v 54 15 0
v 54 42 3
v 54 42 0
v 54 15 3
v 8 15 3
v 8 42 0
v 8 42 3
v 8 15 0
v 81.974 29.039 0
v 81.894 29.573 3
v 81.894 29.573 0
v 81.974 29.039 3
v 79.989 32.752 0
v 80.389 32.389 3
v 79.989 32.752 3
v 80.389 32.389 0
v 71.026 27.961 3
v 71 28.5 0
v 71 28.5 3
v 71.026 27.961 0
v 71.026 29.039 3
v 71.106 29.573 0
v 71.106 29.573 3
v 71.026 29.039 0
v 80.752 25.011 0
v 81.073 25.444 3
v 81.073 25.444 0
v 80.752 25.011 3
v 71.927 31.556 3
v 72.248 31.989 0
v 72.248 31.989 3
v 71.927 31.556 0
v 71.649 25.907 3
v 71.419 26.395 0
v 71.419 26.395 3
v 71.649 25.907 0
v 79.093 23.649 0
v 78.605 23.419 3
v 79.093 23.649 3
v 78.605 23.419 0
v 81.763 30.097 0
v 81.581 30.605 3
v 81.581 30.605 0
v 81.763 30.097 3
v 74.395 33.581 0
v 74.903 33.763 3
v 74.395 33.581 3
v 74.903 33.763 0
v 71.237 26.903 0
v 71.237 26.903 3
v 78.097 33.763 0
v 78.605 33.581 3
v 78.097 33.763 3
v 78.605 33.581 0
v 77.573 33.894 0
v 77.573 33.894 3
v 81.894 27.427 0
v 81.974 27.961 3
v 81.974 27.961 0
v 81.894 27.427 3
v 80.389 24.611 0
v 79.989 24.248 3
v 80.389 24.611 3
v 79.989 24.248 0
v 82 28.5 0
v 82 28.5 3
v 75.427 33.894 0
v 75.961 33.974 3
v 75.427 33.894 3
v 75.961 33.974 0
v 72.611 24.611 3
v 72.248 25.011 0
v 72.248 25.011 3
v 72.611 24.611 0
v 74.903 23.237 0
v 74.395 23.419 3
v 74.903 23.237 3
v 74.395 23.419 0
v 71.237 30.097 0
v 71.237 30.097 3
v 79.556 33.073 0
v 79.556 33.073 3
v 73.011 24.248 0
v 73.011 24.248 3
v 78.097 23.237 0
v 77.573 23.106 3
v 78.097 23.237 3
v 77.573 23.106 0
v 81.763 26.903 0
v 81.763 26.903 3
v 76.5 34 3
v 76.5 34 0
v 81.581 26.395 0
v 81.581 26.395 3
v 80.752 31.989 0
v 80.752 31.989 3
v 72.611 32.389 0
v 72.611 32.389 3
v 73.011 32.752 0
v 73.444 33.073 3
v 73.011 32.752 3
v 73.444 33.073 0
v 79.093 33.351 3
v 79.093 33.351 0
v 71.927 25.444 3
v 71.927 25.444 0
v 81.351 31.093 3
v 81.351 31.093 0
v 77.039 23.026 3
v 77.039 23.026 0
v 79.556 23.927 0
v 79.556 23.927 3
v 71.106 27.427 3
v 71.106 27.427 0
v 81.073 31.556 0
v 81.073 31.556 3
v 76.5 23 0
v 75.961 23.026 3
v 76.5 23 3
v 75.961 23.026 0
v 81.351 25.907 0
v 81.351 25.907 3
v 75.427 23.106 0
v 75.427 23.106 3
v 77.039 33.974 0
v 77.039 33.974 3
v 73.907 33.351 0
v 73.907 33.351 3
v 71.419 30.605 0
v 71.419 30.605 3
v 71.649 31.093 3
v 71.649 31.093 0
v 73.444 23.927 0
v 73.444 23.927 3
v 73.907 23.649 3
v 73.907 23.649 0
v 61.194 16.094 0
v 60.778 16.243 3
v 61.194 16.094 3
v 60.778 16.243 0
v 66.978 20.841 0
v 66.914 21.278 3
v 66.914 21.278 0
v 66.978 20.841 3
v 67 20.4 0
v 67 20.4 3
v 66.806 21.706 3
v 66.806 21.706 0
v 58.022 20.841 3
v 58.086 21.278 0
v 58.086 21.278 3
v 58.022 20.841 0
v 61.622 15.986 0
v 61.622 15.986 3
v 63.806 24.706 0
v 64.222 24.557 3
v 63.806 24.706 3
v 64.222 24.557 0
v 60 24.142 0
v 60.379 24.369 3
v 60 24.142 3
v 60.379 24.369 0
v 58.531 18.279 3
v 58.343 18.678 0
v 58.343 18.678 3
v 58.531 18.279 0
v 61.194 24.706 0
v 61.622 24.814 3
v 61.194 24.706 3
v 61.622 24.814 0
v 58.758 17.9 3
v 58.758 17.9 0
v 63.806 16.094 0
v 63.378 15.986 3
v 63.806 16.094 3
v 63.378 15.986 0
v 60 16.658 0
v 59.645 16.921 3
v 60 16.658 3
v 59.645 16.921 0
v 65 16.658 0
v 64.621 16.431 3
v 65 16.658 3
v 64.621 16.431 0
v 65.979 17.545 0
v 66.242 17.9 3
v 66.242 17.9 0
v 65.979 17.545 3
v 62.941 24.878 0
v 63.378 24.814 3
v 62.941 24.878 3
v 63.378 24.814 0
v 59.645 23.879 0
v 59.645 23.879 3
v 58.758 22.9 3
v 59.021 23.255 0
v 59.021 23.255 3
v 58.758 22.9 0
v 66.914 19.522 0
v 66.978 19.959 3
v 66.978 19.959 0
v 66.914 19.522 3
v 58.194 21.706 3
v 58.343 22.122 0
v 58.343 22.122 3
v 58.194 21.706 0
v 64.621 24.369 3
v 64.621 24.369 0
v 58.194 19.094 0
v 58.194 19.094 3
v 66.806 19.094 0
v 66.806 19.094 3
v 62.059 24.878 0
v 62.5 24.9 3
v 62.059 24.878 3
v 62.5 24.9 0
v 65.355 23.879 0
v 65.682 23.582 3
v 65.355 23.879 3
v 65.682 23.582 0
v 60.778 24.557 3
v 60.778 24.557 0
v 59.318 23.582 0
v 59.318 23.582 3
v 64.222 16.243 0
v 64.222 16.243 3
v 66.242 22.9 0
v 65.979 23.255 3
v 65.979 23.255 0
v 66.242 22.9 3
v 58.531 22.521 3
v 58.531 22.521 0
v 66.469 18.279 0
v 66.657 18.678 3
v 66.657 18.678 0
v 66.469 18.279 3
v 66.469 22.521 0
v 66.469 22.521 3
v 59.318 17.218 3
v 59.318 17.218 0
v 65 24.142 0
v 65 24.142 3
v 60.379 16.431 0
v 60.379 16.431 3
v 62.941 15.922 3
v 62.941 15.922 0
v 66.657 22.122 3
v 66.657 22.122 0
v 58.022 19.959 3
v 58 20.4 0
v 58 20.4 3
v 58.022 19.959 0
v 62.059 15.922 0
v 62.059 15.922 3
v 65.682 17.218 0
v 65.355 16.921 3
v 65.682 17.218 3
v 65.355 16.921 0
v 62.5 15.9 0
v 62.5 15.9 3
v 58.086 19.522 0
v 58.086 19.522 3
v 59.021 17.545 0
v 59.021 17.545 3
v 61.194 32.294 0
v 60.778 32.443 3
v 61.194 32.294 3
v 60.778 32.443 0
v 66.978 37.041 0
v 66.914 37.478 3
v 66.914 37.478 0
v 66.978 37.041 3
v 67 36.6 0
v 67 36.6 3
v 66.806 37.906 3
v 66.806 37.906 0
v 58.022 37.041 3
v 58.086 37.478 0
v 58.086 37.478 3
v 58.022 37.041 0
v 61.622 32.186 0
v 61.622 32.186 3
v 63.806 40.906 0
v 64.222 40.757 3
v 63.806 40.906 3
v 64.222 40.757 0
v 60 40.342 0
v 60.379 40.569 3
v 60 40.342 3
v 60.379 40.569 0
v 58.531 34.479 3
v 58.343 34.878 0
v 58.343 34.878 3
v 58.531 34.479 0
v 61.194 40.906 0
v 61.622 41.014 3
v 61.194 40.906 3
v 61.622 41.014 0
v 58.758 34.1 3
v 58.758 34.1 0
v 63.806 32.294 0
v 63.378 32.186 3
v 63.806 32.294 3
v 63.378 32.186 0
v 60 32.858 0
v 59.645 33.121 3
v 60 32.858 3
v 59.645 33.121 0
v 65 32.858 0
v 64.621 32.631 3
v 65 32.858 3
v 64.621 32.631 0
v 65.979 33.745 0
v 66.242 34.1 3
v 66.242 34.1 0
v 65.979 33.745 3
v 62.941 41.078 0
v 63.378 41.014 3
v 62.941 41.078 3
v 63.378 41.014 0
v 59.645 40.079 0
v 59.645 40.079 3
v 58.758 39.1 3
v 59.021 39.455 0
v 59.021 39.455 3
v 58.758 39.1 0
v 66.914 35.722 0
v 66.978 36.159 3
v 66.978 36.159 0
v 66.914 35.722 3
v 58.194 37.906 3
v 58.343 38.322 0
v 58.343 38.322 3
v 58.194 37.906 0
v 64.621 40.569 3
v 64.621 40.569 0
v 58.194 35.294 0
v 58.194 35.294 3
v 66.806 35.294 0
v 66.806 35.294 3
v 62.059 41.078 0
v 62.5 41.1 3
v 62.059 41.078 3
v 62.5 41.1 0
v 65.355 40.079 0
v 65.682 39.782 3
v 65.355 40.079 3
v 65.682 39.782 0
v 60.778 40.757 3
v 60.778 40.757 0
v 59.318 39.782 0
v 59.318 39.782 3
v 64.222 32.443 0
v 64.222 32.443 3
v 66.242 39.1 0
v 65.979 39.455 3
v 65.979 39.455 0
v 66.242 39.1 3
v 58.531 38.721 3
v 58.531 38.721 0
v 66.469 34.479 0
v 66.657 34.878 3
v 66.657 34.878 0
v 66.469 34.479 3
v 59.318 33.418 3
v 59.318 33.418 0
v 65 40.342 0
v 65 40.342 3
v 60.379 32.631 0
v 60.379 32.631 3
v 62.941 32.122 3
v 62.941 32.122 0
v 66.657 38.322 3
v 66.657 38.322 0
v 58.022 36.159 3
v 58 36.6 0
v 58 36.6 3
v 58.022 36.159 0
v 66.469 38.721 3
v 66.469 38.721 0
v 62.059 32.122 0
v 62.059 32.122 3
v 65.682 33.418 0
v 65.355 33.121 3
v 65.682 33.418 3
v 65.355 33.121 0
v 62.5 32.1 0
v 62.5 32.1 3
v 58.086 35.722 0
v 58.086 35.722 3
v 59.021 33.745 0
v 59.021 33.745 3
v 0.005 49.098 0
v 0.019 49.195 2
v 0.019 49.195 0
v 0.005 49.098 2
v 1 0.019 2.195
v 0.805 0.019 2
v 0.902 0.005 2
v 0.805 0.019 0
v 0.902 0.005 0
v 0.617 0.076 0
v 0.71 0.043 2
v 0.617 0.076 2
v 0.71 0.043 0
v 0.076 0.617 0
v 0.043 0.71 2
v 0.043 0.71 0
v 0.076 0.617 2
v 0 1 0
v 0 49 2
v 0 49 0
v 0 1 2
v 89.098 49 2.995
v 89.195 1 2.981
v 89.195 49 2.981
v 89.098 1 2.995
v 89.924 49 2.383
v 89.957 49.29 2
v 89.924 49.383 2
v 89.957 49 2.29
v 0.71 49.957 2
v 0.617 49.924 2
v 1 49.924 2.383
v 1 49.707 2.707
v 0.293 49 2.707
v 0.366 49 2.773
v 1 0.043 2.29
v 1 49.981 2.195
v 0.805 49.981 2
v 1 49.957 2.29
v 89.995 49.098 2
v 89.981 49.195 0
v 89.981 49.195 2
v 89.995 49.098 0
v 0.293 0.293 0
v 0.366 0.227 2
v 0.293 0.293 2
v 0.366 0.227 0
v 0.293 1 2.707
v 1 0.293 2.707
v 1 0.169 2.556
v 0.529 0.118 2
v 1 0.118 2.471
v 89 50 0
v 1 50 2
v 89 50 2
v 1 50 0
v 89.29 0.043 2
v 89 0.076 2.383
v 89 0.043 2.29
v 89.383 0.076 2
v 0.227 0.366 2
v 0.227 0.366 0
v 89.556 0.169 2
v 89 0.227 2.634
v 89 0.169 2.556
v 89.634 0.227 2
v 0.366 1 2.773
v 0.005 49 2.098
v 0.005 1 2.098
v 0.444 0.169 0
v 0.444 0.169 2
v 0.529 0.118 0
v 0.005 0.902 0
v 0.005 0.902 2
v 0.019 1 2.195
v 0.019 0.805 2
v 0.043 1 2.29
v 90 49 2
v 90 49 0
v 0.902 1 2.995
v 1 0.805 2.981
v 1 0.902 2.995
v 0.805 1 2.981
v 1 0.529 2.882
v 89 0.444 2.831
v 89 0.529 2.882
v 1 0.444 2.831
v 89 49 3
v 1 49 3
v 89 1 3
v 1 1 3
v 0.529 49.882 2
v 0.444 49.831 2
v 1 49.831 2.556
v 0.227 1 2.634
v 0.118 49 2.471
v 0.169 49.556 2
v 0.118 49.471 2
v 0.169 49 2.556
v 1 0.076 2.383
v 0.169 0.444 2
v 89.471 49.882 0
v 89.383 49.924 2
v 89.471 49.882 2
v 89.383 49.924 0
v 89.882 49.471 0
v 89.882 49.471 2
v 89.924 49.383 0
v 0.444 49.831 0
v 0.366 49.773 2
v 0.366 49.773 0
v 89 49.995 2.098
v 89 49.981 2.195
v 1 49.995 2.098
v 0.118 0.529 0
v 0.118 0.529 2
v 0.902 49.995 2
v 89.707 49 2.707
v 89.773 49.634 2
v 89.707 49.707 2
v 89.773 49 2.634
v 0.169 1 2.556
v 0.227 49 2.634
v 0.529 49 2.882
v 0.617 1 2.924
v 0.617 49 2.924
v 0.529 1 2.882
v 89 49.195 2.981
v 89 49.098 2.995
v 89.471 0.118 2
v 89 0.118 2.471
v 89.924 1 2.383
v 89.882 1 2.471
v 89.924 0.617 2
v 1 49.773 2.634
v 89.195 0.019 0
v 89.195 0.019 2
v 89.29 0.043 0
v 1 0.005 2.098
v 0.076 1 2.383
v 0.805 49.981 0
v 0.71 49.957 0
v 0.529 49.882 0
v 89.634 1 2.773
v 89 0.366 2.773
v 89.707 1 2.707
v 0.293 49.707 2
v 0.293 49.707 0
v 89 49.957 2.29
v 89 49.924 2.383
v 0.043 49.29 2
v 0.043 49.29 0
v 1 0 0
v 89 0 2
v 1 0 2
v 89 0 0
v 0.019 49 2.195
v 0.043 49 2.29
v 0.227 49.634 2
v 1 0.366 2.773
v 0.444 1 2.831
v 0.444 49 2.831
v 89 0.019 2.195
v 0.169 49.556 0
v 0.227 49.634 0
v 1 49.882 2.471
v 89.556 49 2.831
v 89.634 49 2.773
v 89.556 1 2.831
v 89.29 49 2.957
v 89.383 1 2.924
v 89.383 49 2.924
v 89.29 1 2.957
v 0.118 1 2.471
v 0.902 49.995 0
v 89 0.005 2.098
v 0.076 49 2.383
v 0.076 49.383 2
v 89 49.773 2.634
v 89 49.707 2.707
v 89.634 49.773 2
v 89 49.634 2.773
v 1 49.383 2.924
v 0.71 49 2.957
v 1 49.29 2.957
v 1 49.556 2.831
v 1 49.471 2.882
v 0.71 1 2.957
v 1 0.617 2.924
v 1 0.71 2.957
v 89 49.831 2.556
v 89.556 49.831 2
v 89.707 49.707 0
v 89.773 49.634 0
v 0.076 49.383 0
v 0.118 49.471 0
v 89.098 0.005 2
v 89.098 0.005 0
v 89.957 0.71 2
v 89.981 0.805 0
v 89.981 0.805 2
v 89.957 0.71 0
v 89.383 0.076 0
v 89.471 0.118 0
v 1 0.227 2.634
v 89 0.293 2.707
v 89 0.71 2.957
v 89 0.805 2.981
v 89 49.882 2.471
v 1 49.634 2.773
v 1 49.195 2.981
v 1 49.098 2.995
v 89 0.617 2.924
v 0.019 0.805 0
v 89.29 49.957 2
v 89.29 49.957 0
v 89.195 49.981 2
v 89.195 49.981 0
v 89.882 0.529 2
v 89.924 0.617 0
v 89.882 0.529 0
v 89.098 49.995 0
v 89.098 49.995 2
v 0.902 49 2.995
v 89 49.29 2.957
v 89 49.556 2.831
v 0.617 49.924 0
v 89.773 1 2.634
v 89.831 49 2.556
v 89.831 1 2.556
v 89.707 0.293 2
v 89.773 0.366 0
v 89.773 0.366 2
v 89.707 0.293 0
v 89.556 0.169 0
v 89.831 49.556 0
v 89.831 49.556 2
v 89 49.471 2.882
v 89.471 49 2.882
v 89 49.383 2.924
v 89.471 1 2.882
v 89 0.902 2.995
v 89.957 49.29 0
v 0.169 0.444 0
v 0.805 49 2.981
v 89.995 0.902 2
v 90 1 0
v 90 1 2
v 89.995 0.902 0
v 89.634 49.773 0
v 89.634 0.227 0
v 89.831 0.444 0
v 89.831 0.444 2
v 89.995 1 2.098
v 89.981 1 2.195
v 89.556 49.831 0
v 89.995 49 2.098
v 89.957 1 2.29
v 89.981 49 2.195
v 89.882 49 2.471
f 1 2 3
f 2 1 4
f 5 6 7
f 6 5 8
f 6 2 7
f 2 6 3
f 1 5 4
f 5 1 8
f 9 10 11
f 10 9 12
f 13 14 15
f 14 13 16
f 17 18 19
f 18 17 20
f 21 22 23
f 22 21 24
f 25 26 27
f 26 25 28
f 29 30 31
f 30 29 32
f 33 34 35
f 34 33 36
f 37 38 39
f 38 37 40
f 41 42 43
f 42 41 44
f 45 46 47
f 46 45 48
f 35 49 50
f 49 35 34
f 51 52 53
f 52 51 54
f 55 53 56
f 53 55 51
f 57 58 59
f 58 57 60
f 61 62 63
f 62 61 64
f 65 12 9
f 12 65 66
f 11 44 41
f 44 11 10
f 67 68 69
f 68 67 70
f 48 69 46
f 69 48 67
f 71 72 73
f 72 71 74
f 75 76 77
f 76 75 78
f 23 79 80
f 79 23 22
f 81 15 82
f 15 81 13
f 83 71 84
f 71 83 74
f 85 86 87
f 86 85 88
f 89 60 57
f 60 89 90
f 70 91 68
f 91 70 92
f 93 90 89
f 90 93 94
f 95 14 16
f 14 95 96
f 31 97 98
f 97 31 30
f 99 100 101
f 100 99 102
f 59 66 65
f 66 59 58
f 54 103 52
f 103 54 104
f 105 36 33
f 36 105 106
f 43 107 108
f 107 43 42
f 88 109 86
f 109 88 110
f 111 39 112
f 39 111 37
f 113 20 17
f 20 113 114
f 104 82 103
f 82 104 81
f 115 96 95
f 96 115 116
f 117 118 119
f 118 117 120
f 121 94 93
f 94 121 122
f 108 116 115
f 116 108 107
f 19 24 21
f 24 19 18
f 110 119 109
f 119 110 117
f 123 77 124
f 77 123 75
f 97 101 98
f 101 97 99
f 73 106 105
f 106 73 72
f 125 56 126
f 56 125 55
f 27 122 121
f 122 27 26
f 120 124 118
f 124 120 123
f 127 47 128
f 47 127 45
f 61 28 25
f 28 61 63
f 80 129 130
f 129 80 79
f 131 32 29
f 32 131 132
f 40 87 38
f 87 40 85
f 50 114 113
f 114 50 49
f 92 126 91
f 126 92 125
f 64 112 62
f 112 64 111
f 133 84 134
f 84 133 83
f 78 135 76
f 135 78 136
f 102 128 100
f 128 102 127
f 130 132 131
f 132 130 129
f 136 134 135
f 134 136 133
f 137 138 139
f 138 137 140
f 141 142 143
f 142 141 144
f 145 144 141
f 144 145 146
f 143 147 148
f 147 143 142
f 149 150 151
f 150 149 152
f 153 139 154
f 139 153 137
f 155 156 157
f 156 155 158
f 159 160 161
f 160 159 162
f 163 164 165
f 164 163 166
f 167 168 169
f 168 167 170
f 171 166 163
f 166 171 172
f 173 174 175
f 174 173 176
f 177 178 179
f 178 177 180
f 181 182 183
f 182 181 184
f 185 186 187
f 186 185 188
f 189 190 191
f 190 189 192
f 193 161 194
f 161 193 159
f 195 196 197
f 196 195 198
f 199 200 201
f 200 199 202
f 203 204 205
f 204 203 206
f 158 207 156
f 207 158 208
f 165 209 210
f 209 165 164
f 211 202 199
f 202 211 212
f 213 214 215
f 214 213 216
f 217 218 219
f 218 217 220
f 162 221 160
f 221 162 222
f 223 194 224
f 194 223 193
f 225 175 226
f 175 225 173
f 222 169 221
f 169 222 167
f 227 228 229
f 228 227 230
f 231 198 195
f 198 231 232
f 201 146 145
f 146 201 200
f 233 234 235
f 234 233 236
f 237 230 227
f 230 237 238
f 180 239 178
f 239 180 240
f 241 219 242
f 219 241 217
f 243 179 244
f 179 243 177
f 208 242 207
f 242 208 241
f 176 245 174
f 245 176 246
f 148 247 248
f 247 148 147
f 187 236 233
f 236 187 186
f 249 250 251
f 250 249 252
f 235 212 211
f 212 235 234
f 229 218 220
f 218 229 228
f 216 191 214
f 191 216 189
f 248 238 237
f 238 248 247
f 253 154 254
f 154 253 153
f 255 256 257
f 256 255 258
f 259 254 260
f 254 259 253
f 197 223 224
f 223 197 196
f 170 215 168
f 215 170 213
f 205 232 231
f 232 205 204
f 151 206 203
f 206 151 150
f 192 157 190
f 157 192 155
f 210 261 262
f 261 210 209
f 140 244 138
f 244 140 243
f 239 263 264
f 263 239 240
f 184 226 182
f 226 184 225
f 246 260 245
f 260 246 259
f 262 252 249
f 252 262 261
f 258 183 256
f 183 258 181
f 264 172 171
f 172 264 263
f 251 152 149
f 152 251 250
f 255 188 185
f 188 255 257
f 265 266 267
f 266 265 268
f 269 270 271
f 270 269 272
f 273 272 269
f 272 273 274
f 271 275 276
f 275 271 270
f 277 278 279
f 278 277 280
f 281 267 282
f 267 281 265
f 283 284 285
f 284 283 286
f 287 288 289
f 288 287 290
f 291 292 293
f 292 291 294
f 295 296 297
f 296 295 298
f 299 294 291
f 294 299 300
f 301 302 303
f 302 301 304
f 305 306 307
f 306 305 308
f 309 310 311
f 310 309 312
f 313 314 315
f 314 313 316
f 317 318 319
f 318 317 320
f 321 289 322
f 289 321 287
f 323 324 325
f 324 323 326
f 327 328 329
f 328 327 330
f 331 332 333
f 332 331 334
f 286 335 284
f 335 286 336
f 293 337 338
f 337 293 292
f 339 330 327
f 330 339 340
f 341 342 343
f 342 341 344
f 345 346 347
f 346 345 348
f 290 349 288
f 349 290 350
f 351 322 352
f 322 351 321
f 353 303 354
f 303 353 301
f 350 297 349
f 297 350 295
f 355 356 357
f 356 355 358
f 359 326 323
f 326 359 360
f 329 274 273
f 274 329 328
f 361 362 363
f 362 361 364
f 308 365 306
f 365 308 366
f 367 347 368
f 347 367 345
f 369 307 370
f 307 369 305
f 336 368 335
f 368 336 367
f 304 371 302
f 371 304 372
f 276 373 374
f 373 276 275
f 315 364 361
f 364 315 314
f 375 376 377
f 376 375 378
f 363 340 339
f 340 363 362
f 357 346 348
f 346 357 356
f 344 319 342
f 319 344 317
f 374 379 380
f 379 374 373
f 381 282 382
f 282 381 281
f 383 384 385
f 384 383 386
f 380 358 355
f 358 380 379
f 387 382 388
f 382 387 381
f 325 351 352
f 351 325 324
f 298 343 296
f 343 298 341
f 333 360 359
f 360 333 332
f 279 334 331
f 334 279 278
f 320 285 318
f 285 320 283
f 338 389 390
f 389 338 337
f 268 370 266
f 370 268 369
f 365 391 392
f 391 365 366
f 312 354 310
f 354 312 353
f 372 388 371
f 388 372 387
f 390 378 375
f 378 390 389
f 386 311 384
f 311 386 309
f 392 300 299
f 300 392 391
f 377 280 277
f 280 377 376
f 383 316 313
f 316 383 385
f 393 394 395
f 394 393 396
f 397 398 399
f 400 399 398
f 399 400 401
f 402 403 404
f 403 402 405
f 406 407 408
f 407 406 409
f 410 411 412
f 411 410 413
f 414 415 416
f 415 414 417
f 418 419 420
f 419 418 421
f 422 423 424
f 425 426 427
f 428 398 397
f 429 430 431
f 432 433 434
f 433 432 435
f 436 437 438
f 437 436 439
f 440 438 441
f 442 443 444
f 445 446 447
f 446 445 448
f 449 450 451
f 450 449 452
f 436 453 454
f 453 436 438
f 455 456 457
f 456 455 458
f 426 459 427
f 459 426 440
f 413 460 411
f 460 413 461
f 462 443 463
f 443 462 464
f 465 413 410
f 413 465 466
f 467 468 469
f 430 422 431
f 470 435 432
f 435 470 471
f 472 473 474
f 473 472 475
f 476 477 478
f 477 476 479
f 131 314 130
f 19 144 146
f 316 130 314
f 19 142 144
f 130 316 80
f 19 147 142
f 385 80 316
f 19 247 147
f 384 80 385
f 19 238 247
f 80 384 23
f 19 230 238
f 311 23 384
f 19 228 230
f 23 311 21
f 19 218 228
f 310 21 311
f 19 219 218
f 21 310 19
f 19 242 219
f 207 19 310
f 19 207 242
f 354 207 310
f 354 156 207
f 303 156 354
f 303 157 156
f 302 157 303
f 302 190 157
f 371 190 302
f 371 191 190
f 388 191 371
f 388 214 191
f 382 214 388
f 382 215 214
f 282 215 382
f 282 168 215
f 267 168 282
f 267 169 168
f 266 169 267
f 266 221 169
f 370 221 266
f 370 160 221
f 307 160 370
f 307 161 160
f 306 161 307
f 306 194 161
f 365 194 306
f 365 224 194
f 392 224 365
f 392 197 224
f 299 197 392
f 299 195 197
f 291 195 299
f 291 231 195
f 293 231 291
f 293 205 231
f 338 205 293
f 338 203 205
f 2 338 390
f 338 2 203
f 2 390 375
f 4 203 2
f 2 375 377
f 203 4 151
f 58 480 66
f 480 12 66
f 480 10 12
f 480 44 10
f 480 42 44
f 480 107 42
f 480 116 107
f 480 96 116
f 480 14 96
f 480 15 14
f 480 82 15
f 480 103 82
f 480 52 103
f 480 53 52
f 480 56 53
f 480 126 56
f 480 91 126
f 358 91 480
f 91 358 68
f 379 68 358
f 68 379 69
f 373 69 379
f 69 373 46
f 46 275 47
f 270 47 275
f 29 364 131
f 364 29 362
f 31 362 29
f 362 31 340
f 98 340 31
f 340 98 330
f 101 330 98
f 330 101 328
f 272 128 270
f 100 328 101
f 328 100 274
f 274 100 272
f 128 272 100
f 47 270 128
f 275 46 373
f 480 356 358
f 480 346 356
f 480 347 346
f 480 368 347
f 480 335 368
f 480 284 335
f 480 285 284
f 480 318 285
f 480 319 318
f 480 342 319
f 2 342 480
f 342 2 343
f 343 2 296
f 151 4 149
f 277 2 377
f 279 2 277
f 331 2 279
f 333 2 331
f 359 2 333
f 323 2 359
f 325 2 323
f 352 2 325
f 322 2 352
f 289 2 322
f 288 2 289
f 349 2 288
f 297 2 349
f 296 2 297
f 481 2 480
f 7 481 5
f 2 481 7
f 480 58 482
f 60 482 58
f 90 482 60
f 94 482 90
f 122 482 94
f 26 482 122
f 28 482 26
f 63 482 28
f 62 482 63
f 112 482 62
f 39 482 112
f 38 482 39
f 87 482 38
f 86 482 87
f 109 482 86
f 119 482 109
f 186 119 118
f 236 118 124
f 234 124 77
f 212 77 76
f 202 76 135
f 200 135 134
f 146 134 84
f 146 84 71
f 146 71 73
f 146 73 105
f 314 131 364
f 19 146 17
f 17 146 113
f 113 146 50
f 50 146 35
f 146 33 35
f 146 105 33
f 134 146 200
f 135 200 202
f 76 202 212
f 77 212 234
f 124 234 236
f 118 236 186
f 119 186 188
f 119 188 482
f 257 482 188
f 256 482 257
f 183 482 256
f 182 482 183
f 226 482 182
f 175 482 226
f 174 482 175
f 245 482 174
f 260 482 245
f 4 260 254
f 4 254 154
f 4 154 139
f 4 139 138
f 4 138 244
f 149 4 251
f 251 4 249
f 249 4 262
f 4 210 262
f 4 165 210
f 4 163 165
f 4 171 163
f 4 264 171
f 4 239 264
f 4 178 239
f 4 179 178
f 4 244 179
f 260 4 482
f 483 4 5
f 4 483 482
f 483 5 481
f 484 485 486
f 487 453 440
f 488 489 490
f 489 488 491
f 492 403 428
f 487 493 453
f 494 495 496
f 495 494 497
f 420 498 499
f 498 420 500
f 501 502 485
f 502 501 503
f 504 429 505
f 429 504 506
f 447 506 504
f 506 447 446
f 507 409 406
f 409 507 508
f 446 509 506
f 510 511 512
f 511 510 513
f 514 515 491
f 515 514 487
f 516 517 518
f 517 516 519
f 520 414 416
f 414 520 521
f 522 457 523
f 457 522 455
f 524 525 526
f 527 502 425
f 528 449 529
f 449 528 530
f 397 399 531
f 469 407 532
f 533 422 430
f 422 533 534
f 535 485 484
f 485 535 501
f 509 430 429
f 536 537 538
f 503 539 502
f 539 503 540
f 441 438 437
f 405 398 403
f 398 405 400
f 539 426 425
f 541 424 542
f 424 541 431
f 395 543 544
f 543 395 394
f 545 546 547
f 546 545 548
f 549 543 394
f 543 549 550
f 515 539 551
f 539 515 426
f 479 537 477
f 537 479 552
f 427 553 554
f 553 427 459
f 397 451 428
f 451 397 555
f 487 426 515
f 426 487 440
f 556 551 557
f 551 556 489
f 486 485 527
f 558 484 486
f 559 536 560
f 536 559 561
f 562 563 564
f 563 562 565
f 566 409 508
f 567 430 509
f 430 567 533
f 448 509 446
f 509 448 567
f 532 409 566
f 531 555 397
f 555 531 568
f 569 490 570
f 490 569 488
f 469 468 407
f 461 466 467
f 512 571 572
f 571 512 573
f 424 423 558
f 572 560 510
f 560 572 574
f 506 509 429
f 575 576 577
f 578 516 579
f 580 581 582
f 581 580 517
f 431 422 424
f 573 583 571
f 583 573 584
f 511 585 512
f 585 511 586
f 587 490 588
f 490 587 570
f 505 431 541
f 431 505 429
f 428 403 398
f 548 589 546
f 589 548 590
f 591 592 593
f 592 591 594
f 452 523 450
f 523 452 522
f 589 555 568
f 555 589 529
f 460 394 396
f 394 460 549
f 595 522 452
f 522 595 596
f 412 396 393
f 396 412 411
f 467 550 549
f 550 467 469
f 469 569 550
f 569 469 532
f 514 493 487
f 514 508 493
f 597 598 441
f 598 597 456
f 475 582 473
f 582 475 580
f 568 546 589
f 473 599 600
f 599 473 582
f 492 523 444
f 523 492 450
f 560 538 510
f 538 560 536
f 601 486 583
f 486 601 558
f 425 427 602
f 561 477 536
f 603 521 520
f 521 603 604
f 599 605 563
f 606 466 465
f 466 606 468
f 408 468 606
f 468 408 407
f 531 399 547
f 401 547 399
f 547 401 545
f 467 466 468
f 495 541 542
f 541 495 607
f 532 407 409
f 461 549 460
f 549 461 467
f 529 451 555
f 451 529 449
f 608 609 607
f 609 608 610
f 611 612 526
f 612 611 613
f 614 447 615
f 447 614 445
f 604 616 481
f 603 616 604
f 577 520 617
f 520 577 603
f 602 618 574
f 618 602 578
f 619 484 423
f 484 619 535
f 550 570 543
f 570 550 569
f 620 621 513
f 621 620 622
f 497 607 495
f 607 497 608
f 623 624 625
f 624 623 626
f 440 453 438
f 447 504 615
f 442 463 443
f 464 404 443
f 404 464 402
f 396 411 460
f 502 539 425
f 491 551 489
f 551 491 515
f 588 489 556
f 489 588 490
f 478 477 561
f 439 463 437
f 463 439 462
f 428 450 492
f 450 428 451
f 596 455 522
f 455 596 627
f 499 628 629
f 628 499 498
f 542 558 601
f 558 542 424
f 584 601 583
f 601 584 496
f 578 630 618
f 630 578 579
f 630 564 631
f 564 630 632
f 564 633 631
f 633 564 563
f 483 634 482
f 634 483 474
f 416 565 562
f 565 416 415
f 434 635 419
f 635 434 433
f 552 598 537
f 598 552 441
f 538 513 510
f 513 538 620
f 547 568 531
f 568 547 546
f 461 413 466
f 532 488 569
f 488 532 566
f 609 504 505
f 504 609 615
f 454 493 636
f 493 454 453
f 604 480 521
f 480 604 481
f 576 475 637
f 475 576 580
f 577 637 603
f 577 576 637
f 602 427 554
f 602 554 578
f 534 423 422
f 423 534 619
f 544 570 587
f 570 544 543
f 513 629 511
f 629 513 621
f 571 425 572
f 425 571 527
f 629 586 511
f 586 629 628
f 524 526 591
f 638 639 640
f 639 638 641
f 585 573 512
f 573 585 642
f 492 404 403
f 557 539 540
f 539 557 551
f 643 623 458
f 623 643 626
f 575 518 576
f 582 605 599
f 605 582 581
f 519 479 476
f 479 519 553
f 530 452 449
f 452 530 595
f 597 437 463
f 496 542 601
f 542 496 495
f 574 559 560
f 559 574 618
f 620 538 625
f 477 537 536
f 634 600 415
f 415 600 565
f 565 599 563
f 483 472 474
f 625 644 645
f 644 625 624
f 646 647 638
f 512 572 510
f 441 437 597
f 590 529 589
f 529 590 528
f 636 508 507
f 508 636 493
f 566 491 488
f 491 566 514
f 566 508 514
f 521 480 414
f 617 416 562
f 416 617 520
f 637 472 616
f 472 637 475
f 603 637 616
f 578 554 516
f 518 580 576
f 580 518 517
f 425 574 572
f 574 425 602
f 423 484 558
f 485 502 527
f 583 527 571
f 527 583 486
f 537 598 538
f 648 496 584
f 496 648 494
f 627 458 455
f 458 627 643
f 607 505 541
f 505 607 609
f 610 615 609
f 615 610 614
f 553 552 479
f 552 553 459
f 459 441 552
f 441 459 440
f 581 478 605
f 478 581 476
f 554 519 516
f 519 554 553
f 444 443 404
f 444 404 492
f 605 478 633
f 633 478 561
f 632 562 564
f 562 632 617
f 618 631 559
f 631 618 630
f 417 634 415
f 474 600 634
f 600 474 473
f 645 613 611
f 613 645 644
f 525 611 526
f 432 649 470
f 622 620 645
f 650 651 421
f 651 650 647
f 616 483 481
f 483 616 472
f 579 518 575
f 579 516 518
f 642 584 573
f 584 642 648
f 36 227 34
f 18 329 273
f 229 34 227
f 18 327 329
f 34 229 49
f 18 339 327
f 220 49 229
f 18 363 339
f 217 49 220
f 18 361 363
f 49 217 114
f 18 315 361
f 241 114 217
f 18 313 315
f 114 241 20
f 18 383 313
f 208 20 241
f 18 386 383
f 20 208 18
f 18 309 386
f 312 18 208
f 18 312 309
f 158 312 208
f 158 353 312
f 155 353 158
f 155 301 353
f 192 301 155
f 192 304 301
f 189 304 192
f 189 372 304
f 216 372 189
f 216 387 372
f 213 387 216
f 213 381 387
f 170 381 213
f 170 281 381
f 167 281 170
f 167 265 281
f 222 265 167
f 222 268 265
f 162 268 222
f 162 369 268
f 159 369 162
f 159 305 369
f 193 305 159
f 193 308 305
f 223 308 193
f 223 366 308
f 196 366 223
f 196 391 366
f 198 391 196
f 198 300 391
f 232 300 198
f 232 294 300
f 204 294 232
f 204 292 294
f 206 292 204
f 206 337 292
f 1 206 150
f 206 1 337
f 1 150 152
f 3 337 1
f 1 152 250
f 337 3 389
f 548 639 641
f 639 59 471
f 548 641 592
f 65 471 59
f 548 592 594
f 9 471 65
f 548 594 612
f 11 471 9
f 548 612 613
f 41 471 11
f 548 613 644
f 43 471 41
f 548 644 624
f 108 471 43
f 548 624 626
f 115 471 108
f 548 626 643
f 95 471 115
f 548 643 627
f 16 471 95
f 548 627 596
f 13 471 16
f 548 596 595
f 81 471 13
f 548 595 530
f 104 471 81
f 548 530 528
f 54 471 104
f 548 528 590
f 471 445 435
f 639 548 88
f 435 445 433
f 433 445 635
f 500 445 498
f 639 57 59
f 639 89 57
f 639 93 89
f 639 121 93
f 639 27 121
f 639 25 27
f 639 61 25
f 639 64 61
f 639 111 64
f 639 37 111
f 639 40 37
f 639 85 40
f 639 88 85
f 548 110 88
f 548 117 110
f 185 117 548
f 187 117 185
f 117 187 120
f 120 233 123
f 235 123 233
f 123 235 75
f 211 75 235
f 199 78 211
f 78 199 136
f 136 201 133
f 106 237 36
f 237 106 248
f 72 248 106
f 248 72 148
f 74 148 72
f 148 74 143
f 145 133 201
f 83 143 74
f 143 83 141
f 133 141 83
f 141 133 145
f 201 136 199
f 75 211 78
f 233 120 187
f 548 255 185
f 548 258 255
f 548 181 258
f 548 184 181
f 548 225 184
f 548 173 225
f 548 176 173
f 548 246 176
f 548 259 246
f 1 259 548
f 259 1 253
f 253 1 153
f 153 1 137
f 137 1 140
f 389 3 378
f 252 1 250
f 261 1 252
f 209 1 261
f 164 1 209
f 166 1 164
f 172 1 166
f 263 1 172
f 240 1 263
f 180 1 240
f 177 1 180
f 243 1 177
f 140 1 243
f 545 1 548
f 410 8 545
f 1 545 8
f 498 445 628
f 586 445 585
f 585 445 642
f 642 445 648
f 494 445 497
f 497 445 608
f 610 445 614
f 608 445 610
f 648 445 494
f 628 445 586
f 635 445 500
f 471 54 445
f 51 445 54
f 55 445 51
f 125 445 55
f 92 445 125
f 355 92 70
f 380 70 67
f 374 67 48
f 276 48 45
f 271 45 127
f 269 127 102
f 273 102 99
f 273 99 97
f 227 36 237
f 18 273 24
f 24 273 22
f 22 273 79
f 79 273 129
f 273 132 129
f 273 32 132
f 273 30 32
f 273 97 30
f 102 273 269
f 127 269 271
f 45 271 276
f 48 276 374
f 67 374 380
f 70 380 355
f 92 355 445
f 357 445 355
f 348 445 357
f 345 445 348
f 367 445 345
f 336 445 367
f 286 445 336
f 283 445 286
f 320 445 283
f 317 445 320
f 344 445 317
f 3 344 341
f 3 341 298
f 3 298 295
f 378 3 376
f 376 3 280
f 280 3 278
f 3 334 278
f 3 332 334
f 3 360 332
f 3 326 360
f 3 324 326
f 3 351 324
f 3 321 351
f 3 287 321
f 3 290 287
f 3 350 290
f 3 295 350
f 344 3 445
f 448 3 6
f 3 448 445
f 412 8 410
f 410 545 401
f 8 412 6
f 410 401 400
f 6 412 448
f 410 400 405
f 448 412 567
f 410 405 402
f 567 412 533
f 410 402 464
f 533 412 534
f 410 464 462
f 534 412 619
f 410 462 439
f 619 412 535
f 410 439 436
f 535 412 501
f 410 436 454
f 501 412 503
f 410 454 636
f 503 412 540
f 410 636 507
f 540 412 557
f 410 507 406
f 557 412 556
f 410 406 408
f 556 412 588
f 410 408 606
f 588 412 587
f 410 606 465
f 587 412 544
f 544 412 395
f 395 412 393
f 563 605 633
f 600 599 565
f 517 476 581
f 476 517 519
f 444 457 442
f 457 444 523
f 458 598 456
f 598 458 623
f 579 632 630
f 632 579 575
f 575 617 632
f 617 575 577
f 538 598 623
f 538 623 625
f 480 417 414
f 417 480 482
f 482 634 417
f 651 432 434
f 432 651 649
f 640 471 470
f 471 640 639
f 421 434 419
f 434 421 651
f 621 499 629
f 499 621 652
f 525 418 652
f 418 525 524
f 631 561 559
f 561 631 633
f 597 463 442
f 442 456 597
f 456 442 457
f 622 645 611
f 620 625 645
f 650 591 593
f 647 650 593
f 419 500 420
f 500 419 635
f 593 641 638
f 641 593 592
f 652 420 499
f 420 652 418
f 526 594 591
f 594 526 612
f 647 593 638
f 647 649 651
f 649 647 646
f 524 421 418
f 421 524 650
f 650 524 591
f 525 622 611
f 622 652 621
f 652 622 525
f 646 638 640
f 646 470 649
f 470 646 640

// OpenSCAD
// file: modules/Modules.scad
/*
	This program is free software: you can redistribute it and/or modify
	it under the terms of the GNU General Public License as published by
	the Free Software Foundation, either version 3 of the License, or
	(at your option) any later version.

	This program is distributed in the hope that it will be useful,
	but WITHOUT ANY WARRANTY; without even the implied warranty of
	MERCHANTABILITY or FITNESS FOR A PARTICULAR PURPOSE.  See the
	GNU General Public License for more details.
	
	Purpose:  Hold general use modules for to simplify making of objects
	
	History:	
		01/25/2024	Initial creation
		02/17/2025	Added modules for roundedCube, roundedCylinder
								and FilletedCylinder
		02/23/2025	refactored filletedCylinder to include tapered cylinders
								reference filletedCylinderV1 to see original

*/

/***********************************************************************
****** Module - screwHole
	Create a hole specifically for a screw to go in.
***********************************************************************/
//screwHole();
module screwHole(screwHole=4.5, screwDepth = 10, screwHead = 9, headTaper = 2.3, screwHeadDepth = 5, s=$fn){
	$fn = s;
	// Common size screws
	
    translate([0,0,-headTaper])cylinder(d1=screwHole, d2=screwHead, h = headTaper, $fn=20);
    translate([0,0,-headTaper-screwDepth])cylinder(d=screwHole, h=screwDepth, $fn=10);
    translate([0,0,-headTaper-screwDepth])cylinder(d=screwHole, h=screwDepth, $fn=10);
    translate([0,0,0]) cylinder(d=screwHead, h=screwHeadDepth, $fn=10);
}

/***********************************************************************
****** Module - roundedCube
	4 various ways to make a cube with soft rounded sides.
***********************************************************************/
//roundedCube(x=50, y=30, z=20, r=5, xyz="x");
//roundedCube(x=50, y=30, z=20, r=5, xyz="y");
//roundedCube(x=50, y=30, z=20, r=5, xyz="z");
//roundedCube(x=50, y=30, z=20, r=5, xyz="all");
//roundedCube(x=50, y=30, z=20, r=5, xyz="all", s=60);
//roundedCube(x=50, y=30, z=20, r=5, xyz="all", s=$fn);
module roundedCube(x=50, y=30, z=20, r=5, xyz="z", s=$fn){
	/* variable definitions
			x = value for x axis
			y = value for y axis
			z = value for z axis
			r = radius
			xyz = axis to have the sides rounded
	*/
	$fn = s;
	hull(){
		if (xyz == "z") {
			translate([r,r,0])cylinder(h=z, r=r);
			translate([x-r,r,0])cylinder(h=z, r=r);
			translate([r,y-r,0])cylinder(h=z, r=r);
			translate([x-r,y-r,0])cylinder(h=z, r=r);
		} else if (xyz == "y") {
			translate([r,0,r])rotate([-90,0,0])cylinder(h=y, r=r);
			translate([x-r,0,r])rotate([-90,0,0])cylinder(h=y, r=r);
			translate([r,0,z-r])rotate([-90,0,0])cylinder(h=y, r=r);
			translate([x-r,0,z-r])rotate([-90,0,0])cylinder(h=y, r=r);
		} else if (xyz == "x") {
			translate([0,r,r])rotate([0,90,0])cylinder(h=x, r=r);
			translate([0,y-r,r])rotate([0,90,0])cylinder(h=x, r=r);
			translate([0,r,z-r])rotate([0,90,0])cylinder(h=x, r=r);
			translate([0,y-r,z-r])rotate([0,90,0])cylinder(h=x, r=r);
		} else if (xyz == "all") {
			minkowski(){
				translate([r,r,r])cube([x-r*2,y-r*2,z-r*2]);
				sphere(r=r);
			}			
		} else { 
			echo("XYZ not set");
		}
	}
}

/***********************************************************************
******* Module - roundedCylinder
	Create a cylinder with nice rounded outter top and bottom
***********************************************************************/
//roundedCylinder();
//roundedCylinder(d=200, h=100, r=5);
//difference(){roundedCylinder(d=20, h=10, r=1, s=60);filletedCylinder(d=5, h=10, tr=2, br=1, pad=0, s=30);}
module roundedCylinder(d=200, h=100, r=5, s=$fn){
	$fn = s;
	hull(){
		translate([0,0,r])rotate_extrude()translate([d/2-r,0,0])circle(r=r);
		translate([0,0,h-r])rotate_extrude()translate([d/2-r,0,0])circle(r=r);
	}
}

/***********************************************************************
******* Module - filletedCylinder
	Create a cylinder with flared top and/or bottoms.
	Used for making rounded top/bottom holes in objects.
	Usage:
		d = diamater
		td = top diamater.  d will be used if not provided
		dd = bottom diamater.  d will be used if not provided
		h = height
		r = radius of the fillet
		tr = top radius.  r will be used if not provided
		br = bottom radius.  r will be used if not provided
		pad = filler around the radius  5 is usually good unless very small
		s = smoothing.  generally let $fn of the object do the work.
***********************************************************************/
//filletedCylinder();
//filletedCylinder(d=50, h=100, r=5, pad=5, s=$fn);
//filletedCylinder(d=10, h=20, tr=1, br=1, pad=.1, s=60);
//difference(){roundedCylinder();filletedCylinder();}
//difference(){roundedCylinder(d=200, h=100, r=5);filletedCylinder(d=50, h=100, tr=10, br=5, pad=5);}
//difference(){roundedCylinder(d=20, h=10, r=1, s=30);filletedCylinder(d=5, h=10, tr=2, br=1, pad=0, s=30);}
//filletedCylinder(d=50, td=20, bd=60, h=100, tr=10, br=5, pad=5, s=$fn);
//difference(){roundedCylinder(s=60);filletedCylinder(d=50, td=50, bd=20, h=100, tr=10, br=5, pad=5, s=$fn);}
module filletedCylinder(d=50, td=0, bd=0, h=100, tr=0, br=0, r=5, pad=5, s=$fn){
	$fn = s;
	shift = .1;

	// Calulate for one or two radises
	tRad = tr > 0 ? tr : r;
	bRad = br > 0 ? br : r;
	//echo(tRad, bRad);

	// Calculate for one diamater or two.
	tDia = td > 0 ? td : d;
	bDia = bd > 0 ? bd : d;
	//echo(tDia, bDia);

	// Calculate the shift of the radius in due to angle of a cone
  trShift = tDia > bDia ? tRad * tan(atan(((tDia/2)-(bDia/2))/h)) : 0;
	brShift = bDia > tDia ? bRad * tan(atan(((bDia/2)-(tDia/2))/h)) : 0;
	//echo(trShift, brShift);

	translate([0,0,-shift])cylinder(h=h+shift*2, r1=bDia/2, r2=tDia/2);
	if ( bRad > 0 ){
		// bottom
		translate([0,0,-shift])
			difference(){
				rotate_extrude()translate([bDia/2-pad-brShift,0,0])square([bRad+pad, bRad]);
				rotate_extrude()translate([bDia/2+bRad-brShift,bRad,0])circle(r=bRad);
			}
	}
	if ( tRad > 0 ){
		// top
		translate([0,0,h-tRad+shift])
			difference(){
				rotate_extrude()translate([tDia/2-pad-trShift,0,0])square([tRad+pad, tRad]);
				rotate_extrude()translate([tDia/2+tRad-trShift,0,0])circle(r=tRad);
			}
	}
}

		// v1 kept for reference.  No longer used
		// module filletedCylinderV1(d=50, h=100, tr=10, br=5, pad=5, s=$fn){
		// 	$fn = s;
		// 	shift = .1;
		// 	translate([0,0,-shift])cylinder(h=h+shift*2, r=d/2);
		// 	if ( br > 0 ){
		// 		// bottom
		// 		translate([0,0,-shift])
		// 			difference(){
		// 				rotate_extrude()translate([d/2-pad,0,0])square([br+pad, br]);
		// 				rotate_extrude()translate([d/2+br,br,0])circle(r=br);
		// 			}
		// 	}
		// 	if ( tr > 0 ){
		// 		// top
		// 		translate([0,0,h-tr+shift])
		// 			difference(){
		// 				rotate_extrude()translate([d/2-pad,0,0])square([tr+pad, tr]);
		// 				rotate_extrude()translate([d/2+tr,0,0])circle(r=tr);
		// 			}
		// 	}
		// }

/***********************************************************************
******* Module - CylinderFillet
	Fillet the outter circumfrence of a cylinder.
***********************************************************************/
//difference(){cylinder(h=20, d=100);cylinderFillet(d = 100, r=5);}
/*difference(){
	cylinder(h=20, d=100);
	cylinderFillet(d = 100, r=5);
	translate([0,0,20])rotate([180,0,0])cylinderFillet(d = 100, r=5, s=60);
}*/
module cylinderFillet(d = 100, r=5, s=$fn){
		$fn = s;
		pad = 0.1;	// Padding to maintain manifold
		translate([0,0,0])
		difference() {
				rotate_extrude(convexity=10)
						translate([d/2-r+pad,-pad,0])
								square(r+pad,r+pad);
				#rotate_extrude(convexity=10)
						translate([d/2-r,r,0])
								circle(r=r);
		}
}
// main file
/*
	This program is free software: you can redistribute it and/or modify
	it under the terms of the GNU General Public License as published by
	the Free Software Foundation, either version 3 of the License, or
	(at your option) any later version.

	This program is distributed in the hope that it will be useful,
	but WITHOUT ANY WARRANTY; without even the implied warranty of
	MERCHANTABILITY or FITNESS FOR A PARTICULAR PURPOSE.  See the
	GNU General Public License for more details.
	
	Purpose:  Benchtop power supply from an old ATX power supply
	GitHub:		https://github.com/bbaumg/3DPrinter/blob/master/Objects/ATXBenchtopMount.scad
	
	History:	
		02/17/2025	Initial creation

	Notes:
		- ATX Standards:  https://landing.coolermaster.com/faq/what-are-the-mounting-hole-dimensions-for-my-atx-power-supply/

*/

/****** Variables ******************************************************
***********************************************************************/
faceHeight = 160;
faceWidth = 90;
faceThick = 3;
faceSpaceX = 8;						// space from left side
faceSpaceY = 15;					// space up from bottom
dispHeight = 27;
dispWidth = 46;
dispSpaceX = faceSpaceX;
dispSpaceY = 10;
fuseDiamater = 11;
plugDiamater = 9;					// binderPost/plug connecter
frameDepth = 200;
frameThick = 3;

// Special variables
$fn = $preview ? 32 : 64;		// 0 is OpenSCAD default

/****** Imports & Includes & Calculations ******************************
***********************************************************************/
include <modules/Modules.scad>

// Calculations


/****** The Object *****************************************************
***********************************************************************/
/* TODO List:
		- USB ports on the front.
*/
//object();
	// Start creating the object
	//face();
	// translate([faceWidth+2,0,0])sides();
	// translate([-frameDepth-2,0,0])sides();
	// translate([0,faceHeight+2,0])topBottom();
	// translate([0,-frameDepth-2,0])topBottom();
	// translate([faceWidth+frameDepth+4,0,0])back();
	//translate([faceWidth+2,0,0])frame();
	//roundedCubeMostly(x=faceWidth, y=faceHeight, z=faceThick, r=1);

/*Some basic commands
translate([0,0,0])
rotate([0,0,0])
*/
test();
module test(){
faceHeight = 50;
faceWidth = 90;
faceThick = 3;
faceSpaceX = 8;						// space from left side
faceSpaceY = 15;					// space up from bottom

dispHeight = 27;
dispWidth = 46;
dispSpaceX = faceSpaceX;
dispSpaceY = 10;
fuseDiamater = 11;
plugDiamater = 9;					// binderPost/plug connecter

frameDepth = 200;
frameThick = 3;

	difference(){
		roundedCubeFlatBottom(x=faceWidth, y=faceHeight, z=faceThick, r=1);
		// Remove screw holes
		// Remove power switch(s)?
		for (i = [0:1:0]){
			echo(i);
			// Remove displays
			translate([dispSpaceX,faceSpaceY+(i*(dispHeight+dispSpaceY)),-1]) cube([dispWidth, dispHeight, faceThick+2]);
			// Remove fuse holes
			translate([faceWidth-faceSpaceX-(fuseDiamater/2),faceSpaceY+(i*(dispHeight+dispSpaceY))+(dispHeight/2),-1]) rotate([0,0,0]) cylinder(d=fuseDiamater, h=faceThick+2);
			// calculate plug placement on X axis
			plugSpaceX = faceSpaceX+dispWidth+(faceWidth-2*faceSpaceX-dispWidth-fuseDiamater)/2;
			// Remove + plug hole
			translate([plugSpaceX,faceSpaceY+(i*(dispHeight+dispSpaceY))+(dispHeight/5*1),-1]) rotate([0,0,0]) cylinder(d=plugDiamater, h=faceThick+2);
			// Remove - plug Hole
			translate([plugSpaceX,faceSpaceY+(i*(dispHeight+dispSpaceY))+(dispHeight/5*4),-1]) rotate([0,0,0]) cylinder(d=plugDiamater, h=faceThick+2);
		}
	}
}

module face(){
	difference(){
		roundedCubeFlatBottom(x=faceWidth, y=faceHeight, z=faceThick, r=1);
		// Remove screw holes
		// Remove power switch(s)?
		for (i = [0:1:2]){
			echo(i);
			// Remove displays
			translate([dispSpaceX,faceSpaceY+(i*(dispHeight+dispSpaceY)),-1]) cube([dispWidth, dispHeight, faceThick+2]);
			// Remove fuse holes
			translate([faceWidth-faceSpaceX-(fuseDiamater/2),faceSpaceY+(i*(dispHeight+dispSpaceY))+(dispHeight/2),-1]) rotate([0,0,0]) cylinder(d=fuseDiamater, h=faceThick+2);
			// calculate plug placement on X axis
			plugSpaceX = faceSpaceX+dispWidth+(faceWidth-2*faceSpaceX-dispWidth-fuseDiamater)/2;
			// Remove + plug hole
			translate([plugSpaceX,faceSpaceY+(i*(dispHeight+dispSpaceY))+(dispHeight/5*1),-1]) rotate([0,0,0]) cylinder(d=plugDiamater, h=faceThick+2);
			// Remove - plug Hole
			translate([plugSpaceX,faceSpaceY+(i*(dispHeight+dispSpaceY))+(dispHeight/5*4),-1]) rotate([0,0,0]) cylinder(d=plugDiamater, h=faceThick+2);
		}
	}
}

//  That won't work...  Too long print time.
module frame(){
screwShaft = 10;
holeDiameter = 10;
holeSpacing = 2;
holePadding = 30;
// Calculations
holesWide = round((faceHeight-(holePadding*2))/(holeDiameter+holeSpacing));
echo(holesWide);
holePaddingY = (faceHeight-(holesWide*(holeDiameter+holeSpacing)-holeSpacing))/2;
echo(holePaddingY);
holesHigh = round((frameDepth-(holePadding*2))/(holeDiameter+holeSpacing));
echo(holesHigh);
holePaddingZ = (frameDepth-(holesHigh*(holeDiameter+holeSpacing)-holeSpacing))/2;;
echo(holePaddingZ);
difference(){
		roundedCube(x=faceWidth, y=faceHeight, z=frameDepth, r=1, xyz="z");
		translate([frameThick,frameThick,-1])roundedCube(x=faceWidth-frameThick*2, y=faceHeight-frameThick*2, z=frameDepth+2, r=1, xyz="z");
		for (i = [0:1:holesWide-1]){
			for (ii = [0:1:holesHigh-1]){
				//echo("i = ", i);
				//echo("ii = ", ii);
				#translate([0,i*(holeDiameter+holeSpacing),ii*(holeDiameter+holeSpacing)])
					translate([0,holePaddingY,holePaddingZ])
						translate([-1,holeDiameter/2,holeDiameter/2])
							rotate([0,90,0])cylinder(d=holeDiameter,h=faceWidth+2, $fn=6);
			}
		}
	}
	translate([screwShaft/2,screwShaft/2,0])cylinder(d=7,h=frameDepth);
}

module sides(){
	roundedCube(x=frameDepth, y=faceHeight, z=faceThick, r=1, xyz="z");
}

module topBottom(){
	roundedCube(x=faceWidth, y=frameDepth, z=faceThick, r=1, xyz="z");
}

module back(){
	roundedCubeFlatBottom(x=faceWidth, y=faceHeight, z=faceThick, r=1);
}

module roundedCubeFlatBottom(x=50, y=30, z=20, r=5, s=$fn){
	assert (r <= z/2, "ERROR: r must be half z or smaller to work properly")
	hull(){
		translate([r,r,0])cylinder(h=z-r, r=r);
		translate([x-r,r,0])cylinder(h=z-r, r=r);
		translate([r,y-r,0])cylinder(h=z-r, r=r);
		translate([x-r,y-r,0])cylinder(h=z-r, r=r);
		translate([r,r,z-r])rotate([-90,0,0])cylinder(h=y-r*2, r=r);
		translate([x-r,r,z-r])rotate([-90,0,0])cylinder(h=y-r*2, r=r);
		translate([r,r,z-r])rotate([0,90,0])cylinder(h=x-r*2, r=r);
		translate([r,y-r,z-r])rotate([0,90,0])cylinder(h=x-r*2, r=r);
	}
}

/****** Batch Export***************************************************
	Use this module to create multiple exports based on rerenderd values
	https://github.com/18107/OpenSCAD-batch-export-stl
	<modules/export.py>
	
	This script searches for "module export()" and individually renders
	and exports each item in it. Each item is expected to be on its own line. 
	The file name will be the comment on the same line, or the module 
	call if no comment exists. All files will be put in a folder with 
	the same name as the scad file it's created from.
***********************************************************************/
module export() {
	//object(x); //file name here.
}
